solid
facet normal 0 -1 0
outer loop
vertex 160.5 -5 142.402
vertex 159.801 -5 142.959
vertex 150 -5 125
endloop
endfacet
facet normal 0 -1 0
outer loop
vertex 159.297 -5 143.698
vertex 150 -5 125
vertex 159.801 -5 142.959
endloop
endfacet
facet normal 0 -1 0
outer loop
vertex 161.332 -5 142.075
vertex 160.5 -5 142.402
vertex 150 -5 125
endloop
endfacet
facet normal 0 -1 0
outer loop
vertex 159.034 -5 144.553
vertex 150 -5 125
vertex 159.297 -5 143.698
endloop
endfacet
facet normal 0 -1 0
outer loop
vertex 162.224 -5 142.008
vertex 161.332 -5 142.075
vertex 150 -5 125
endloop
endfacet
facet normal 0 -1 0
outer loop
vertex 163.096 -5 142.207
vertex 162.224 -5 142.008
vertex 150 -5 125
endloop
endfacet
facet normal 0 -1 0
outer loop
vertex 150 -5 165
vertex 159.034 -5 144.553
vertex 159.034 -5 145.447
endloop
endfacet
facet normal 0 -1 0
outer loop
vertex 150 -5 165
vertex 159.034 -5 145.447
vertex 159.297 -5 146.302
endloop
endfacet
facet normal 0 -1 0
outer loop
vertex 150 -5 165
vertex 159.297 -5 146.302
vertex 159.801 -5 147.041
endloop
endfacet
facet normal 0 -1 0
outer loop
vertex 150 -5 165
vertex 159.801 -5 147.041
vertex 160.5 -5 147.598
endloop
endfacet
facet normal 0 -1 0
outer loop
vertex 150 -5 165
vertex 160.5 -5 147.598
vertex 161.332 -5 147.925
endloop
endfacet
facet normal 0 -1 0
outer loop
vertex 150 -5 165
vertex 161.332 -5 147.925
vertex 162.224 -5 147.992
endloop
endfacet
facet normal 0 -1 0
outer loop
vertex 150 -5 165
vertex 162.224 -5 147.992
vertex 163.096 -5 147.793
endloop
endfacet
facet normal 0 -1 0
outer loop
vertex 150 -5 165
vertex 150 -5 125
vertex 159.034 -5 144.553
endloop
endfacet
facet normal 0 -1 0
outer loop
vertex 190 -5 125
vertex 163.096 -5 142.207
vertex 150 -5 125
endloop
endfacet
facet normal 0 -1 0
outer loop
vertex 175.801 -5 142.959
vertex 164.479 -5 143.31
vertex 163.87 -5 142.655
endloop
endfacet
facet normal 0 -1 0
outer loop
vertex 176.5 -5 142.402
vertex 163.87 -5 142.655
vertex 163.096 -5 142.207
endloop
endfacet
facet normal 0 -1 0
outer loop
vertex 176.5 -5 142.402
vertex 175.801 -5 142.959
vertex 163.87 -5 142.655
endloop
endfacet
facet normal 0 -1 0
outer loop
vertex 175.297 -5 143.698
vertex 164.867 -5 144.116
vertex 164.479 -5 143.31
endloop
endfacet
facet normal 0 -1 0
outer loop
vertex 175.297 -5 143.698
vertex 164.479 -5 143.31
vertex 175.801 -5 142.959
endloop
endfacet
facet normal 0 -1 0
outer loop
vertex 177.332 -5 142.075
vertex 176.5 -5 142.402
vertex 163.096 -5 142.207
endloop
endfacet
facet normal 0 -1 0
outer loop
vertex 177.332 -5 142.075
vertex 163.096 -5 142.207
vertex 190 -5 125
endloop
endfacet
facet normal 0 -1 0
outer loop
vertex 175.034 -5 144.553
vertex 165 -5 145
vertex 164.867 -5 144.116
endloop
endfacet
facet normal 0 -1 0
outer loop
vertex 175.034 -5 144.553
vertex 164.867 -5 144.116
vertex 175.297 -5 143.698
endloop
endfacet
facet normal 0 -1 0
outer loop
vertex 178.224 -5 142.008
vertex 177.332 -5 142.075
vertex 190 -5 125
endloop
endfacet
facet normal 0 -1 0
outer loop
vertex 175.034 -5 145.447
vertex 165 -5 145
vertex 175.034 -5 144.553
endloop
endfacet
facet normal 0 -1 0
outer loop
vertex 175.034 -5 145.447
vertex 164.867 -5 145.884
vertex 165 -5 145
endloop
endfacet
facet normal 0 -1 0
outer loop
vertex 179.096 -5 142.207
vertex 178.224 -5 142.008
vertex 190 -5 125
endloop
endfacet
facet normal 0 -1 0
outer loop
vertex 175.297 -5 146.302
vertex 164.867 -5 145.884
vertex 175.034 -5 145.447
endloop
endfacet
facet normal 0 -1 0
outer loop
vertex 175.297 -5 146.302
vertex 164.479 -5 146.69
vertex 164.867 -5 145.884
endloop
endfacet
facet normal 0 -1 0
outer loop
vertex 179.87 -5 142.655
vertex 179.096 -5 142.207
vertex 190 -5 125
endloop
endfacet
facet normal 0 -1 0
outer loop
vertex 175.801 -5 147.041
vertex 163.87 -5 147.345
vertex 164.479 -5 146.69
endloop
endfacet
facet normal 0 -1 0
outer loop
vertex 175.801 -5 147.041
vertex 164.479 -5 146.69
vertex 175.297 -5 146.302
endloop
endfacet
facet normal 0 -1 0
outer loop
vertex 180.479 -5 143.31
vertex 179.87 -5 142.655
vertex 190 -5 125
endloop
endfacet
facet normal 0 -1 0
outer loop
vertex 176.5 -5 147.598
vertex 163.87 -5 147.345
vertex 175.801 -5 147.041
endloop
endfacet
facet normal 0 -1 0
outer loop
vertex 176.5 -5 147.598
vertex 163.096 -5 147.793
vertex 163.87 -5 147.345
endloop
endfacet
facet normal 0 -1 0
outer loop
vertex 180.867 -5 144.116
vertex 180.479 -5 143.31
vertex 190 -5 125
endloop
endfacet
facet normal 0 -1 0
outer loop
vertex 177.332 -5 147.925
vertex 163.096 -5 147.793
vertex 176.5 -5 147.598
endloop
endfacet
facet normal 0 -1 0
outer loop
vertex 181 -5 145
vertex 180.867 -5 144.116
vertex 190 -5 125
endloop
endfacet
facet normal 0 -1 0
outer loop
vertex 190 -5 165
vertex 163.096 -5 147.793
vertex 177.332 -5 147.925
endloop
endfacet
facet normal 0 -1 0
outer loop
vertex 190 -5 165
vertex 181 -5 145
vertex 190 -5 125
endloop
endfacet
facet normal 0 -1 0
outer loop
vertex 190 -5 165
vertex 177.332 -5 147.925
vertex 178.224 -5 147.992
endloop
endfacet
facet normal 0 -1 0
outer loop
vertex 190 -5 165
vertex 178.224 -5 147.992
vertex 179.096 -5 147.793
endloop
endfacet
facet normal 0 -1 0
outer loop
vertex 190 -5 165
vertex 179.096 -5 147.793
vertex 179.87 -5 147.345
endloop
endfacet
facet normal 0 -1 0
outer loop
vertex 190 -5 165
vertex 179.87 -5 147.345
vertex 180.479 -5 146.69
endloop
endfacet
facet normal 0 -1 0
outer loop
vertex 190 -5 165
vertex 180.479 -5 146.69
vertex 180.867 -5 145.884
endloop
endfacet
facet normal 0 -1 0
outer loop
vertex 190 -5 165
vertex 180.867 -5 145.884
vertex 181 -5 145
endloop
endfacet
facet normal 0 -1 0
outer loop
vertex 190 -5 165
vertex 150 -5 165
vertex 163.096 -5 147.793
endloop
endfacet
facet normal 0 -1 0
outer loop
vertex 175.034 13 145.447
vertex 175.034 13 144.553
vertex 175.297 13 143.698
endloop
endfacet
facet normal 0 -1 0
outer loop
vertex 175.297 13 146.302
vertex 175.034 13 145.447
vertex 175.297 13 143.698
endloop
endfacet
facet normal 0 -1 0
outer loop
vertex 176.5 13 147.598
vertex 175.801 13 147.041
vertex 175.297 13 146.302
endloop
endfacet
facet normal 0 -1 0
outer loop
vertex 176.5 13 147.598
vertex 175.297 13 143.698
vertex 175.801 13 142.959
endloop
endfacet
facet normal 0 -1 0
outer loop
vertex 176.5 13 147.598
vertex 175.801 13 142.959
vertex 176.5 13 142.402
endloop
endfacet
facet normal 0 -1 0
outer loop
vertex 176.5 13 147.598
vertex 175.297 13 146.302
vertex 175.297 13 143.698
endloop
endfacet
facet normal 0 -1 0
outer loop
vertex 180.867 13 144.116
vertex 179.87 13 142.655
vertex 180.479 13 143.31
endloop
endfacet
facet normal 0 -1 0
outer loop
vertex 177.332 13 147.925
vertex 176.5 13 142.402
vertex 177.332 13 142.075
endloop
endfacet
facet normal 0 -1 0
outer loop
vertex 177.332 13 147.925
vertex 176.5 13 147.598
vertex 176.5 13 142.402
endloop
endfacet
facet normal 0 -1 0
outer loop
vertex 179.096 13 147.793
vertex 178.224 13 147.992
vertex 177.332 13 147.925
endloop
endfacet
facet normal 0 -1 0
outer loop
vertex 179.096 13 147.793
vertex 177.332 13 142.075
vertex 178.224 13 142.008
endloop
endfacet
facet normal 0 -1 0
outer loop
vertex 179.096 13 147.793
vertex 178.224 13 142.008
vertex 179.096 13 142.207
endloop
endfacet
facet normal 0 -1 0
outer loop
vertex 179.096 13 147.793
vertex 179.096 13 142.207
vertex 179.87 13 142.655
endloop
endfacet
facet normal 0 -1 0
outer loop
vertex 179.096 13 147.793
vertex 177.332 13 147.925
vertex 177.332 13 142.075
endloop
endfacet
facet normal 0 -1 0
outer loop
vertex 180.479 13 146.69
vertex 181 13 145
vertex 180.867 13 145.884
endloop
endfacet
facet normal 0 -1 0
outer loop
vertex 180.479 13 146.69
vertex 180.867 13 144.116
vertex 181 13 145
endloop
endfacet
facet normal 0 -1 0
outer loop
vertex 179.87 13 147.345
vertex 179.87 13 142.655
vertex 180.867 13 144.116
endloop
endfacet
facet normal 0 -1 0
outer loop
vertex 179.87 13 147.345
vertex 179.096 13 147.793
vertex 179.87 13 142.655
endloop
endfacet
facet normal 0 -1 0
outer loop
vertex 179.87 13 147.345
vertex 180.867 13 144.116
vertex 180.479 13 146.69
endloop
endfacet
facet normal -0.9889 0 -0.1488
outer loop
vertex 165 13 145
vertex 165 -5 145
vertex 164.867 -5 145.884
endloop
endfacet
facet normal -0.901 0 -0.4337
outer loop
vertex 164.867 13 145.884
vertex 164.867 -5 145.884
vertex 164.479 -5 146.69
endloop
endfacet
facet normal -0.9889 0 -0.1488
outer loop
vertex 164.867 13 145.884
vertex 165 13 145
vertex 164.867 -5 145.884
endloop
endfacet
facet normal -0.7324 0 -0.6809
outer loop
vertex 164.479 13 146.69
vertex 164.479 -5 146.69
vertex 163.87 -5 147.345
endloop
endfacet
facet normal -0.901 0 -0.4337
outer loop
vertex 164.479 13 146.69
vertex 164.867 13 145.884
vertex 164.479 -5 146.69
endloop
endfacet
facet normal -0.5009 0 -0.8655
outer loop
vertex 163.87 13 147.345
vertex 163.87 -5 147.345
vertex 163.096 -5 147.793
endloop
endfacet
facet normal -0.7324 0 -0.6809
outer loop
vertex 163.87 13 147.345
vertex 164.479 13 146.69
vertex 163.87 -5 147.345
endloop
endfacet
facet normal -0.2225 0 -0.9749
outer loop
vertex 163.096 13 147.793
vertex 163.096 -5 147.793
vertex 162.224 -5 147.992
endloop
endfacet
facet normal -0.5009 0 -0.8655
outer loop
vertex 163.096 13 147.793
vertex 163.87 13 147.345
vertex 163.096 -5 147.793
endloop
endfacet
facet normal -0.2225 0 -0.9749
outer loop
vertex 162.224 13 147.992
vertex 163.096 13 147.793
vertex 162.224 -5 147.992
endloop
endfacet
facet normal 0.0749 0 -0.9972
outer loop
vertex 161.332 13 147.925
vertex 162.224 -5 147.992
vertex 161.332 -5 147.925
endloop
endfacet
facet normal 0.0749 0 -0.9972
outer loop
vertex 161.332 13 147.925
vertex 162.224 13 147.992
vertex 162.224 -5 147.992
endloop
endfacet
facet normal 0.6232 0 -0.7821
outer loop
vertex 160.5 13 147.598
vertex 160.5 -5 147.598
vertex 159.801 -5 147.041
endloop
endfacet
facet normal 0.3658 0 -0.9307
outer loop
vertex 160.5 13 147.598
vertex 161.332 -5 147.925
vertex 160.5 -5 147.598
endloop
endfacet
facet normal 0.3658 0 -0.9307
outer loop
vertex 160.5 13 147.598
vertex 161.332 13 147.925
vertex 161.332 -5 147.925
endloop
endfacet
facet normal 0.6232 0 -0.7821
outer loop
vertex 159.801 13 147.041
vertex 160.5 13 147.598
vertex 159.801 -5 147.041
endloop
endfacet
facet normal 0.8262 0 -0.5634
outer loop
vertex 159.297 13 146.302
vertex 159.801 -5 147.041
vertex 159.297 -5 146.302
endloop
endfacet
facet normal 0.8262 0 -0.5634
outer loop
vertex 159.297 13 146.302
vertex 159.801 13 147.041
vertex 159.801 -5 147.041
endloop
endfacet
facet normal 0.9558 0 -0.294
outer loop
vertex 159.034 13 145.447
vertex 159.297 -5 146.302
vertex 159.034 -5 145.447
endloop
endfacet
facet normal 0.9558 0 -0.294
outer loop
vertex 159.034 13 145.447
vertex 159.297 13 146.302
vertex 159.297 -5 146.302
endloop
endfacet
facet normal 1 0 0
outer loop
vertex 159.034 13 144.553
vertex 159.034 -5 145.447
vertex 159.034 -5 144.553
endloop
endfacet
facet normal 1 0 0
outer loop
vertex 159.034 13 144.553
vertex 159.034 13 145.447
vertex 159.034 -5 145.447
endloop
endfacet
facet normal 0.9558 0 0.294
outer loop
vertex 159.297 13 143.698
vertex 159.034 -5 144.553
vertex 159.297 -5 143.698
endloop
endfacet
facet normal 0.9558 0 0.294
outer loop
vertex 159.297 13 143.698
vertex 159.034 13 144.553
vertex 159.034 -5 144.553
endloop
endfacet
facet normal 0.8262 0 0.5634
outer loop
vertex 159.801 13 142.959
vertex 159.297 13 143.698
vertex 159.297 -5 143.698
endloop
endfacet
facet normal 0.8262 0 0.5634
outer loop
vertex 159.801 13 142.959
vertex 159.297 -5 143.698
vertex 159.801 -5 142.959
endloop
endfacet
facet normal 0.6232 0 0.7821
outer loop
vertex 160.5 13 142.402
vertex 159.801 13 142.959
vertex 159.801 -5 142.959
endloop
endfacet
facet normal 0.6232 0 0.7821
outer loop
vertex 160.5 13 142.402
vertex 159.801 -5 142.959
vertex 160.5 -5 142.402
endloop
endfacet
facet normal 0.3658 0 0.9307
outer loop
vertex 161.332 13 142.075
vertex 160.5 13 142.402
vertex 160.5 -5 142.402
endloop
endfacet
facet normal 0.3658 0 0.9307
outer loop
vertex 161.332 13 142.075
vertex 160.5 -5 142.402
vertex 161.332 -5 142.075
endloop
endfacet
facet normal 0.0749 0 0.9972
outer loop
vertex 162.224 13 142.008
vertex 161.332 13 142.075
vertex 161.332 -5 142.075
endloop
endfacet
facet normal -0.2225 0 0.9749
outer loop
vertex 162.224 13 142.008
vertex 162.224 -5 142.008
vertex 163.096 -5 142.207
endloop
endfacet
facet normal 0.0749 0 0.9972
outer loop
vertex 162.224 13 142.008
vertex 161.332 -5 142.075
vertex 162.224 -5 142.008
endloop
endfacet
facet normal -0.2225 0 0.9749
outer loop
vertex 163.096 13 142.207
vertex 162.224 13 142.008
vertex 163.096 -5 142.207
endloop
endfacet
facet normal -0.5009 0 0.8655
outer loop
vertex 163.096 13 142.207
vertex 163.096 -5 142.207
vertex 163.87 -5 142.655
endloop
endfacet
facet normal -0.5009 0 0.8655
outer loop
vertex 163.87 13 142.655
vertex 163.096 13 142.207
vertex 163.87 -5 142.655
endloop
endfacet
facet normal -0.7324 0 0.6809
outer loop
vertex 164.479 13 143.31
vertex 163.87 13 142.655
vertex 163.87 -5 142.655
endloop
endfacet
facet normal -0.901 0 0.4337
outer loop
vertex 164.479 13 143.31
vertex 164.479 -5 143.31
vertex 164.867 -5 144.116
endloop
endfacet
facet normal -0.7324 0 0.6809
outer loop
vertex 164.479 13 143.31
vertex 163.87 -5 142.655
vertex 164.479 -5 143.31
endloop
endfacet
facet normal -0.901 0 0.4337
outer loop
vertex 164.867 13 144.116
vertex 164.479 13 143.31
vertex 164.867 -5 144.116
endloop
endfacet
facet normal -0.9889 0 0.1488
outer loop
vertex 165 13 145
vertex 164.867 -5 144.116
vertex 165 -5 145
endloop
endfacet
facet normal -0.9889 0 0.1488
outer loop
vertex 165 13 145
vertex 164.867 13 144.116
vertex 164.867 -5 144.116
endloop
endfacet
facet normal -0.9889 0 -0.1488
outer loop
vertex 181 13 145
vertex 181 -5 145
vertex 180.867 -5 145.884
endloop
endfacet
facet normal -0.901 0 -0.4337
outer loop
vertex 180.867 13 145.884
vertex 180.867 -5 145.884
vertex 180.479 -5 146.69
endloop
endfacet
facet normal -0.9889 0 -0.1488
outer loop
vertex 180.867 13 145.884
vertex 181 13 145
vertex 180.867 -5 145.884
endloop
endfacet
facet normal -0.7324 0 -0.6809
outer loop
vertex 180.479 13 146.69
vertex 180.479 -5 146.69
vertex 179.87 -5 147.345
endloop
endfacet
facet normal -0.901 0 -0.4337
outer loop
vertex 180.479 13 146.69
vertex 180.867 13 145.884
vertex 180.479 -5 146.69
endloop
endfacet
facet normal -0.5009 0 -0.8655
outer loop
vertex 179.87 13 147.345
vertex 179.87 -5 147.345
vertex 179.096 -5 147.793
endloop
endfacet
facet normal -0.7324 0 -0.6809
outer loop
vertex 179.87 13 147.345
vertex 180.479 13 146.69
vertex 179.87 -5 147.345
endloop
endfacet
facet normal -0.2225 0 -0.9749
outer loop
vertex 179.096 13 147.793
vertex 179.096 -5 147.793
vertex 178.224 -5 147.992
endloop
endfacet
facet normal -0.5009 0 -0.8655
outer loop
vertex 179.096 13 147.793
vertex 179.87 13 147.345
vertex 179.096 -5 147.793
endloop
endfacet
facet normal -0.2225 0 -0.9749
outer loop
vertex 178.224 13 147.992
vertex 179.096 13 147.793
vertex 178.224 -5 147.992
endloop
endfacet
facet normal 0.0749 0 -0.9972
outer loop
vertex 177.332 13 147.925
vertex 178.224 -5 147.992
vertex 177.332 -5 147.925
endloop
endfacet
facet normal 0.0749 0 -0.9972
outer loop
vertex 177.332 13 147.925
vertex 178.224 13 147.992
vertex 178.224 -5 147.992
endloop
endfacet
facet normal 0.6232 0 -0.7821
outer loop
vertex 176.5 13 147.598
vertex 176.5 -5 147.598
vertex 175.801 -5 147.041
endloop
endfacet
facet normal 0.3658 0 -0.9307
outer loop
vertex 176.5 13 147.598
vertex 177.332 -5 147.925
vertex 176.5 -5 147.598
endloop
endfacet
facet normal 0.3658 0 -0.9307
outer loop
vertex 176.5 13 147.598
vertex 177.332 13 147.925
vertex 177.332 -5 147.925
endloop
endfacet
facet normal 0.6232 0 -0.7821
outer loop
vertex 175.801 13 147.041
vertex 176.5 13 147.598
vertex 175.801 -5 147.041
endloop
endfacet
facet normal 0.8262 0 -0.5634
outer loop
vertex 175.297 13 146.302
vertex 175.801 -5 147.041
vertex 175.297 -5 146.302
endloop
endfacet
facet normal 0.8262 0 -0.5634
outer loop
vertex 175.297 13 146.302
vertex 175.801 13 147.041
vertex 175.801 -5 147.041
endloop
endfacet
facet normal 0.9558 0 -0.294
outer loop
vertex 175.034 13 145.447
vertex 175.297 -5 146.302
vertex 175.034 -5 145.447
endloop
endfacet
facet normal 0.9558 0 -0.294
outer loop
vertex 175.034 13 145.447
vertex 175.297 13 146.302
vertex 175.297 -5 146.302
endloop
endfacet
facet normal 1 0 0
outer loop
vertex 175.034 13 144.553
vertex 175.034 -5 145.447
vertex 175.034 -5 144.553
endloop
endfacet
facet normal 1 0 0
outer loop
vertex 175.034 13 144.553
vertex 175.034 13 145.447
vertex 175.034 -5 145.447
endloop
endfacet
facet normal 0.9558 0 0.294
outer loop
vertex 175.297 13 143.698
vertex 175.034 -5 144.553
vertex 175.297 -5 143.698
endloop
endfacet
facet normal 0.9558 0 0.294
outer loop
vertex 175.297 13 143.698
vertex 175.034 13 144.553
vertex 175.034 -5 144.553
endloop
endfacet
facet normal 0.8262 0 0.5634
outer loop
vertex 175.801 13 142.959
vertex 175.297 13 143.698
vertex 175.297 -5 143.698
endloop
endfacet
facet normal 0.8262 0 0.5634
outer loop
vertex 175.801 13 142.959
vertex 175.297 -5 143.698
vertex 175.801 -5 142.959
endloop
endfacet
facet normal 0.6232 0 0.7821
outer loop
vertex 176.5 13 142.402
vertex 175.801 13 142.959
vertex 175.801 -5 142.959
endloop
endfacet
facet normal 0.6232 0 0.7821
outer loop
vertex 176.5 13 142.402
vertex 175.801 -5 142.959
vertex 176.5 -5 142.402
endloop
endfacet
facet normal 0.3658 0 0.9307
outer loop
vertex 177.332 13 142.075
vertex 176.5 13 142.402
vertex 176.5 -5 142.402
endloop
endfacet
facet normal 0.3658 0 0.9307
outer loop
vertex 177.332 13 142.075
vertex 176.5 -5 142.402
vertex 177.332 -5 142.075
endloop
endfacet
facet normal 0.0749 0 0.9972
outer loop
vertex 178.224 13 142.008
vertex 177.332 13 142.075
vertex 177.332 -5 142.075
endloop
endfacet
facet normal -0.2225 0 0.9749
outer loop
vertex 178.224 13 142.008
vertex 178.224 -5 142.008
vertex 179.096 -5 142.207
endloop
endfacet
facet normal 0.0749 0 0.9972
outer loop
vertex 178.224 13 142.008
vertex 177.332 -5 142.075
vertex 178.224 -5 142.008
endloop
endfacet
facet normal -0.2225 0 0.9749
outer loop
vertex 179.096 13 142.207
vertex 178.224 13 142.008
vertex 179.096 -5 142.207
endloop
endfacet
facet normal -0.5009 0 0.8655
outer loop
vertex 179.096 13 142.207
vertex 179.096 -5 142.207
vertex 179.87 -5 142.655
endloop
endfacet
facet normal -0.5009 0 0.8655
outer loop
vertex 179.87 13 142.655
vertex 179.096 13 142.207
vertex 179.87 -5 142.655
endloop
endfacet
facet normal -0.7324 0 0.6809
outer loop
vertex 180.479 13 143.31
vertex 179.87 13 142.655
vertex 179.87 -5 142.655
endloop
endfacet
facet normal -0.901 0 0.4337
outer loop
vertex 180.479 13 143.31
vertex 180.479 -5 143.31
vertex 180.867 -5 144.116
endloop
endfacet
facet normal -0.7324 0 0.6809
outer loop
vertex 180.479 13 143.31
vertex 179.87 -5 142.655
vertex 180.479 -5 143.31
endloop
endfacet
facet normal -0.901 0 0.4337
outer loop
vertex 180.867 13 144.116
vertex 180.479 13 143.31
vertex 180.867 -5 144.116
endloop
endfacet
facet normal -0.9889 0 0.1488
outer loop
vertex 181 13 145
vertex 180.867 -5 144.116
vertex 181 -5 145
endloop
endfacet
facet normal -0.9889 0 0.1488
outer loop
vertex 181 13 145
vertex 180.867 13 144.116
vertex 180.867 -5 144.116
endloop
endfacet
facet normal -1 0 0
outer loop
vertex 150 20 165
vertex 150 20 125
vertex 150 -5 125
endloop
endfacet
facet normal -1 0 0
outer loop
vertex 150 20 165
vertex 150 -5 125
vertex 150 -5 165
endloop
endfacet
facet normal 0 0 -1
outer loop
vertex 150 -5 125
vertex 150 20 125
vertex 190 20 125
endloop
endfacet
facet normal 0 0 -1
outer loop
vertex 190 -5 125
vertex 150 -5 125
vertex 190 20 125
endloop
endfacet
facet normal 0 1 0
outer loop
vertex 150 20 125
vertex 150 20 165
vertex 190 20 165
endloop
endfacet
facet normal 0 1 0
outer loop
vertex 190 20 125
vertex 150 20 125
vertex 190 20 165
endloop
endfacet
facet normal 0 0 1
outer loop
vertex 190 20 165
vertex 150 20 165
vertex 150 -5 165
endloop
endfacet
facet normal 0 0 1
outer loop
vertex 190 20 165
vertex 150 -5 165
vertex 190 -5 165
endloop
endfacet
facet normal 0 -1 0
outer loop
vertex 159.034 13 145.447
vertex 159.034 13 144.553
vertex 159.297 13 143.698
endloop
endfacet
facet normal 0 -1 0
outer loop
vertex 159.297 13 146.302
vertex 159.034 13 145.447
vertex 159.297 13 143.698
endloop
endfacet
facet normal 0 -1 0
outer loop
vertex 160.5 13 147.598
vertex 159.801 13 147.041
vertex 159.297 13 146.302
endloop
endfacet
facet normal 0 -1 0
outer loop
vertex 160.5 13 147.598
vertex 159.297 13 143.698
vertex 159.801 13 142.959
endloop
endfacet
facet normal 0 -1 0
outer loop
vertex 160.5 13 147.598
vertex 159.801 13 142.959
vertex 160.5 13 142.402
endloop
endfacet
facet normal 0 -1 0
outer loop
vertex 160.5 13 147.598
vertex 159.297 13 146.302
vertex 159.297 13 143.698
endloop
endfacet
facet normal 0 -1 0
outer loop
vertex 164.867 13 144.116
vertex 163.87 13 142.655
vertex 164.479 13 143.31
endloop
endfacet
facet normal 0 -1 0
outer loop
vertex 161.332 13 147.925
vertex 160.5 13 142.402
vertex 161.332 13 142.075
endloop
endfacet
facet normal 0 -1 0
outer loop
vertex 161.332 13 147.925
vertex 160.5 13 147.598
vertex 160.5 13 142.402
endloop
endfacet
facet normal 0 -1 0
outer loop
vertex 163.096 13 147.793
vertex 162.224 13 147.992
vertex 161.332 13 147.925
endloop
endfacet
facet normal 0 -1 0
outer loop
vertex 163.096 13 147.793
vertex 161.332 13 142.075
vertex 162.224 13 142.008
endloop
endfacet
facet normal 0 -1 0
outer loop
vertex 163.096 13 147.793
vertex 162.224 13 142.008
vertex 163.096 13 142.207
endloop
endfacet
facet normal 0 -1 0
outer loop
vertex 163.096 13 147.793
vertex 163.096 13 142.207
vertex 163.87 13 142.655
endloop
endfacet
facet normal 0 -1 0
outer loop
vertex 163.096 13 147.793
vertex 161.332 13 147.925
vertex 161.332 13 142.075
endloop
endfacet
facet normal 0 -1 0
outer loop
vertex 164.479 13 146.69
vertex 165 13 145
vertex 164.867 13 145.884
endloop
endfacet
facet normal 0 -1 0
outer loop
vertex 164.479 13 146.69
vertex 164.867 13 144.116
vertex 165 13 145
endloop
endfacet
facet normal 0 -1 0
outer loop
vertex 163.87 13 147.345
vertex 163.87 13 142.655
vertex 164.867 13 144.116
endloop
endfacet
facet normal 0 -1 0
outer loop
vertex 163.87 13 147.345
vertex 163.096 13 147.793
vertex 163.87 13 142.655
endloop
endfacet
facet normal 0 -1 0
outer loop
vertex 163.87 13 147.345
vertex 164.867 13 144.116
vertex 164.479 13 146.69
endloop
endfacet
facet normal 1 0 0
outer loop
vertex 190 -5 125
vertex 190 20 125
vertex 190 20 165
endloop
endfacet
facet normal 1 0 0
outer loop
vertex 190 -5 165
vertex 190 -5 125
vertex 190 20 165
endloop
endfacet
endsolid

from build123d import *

# Parameters (mm, degrees)
CYLINDER016_R          = 3
CYLINDER016_DEPTH      = 20
CYLINDER016_ROLL_ANGLE = 90
CYLINDER015_R          = 3
CYLINDER015_DEPTH      = 20
CYLINDER015_ROLL_ANGLE = 90
BOX016_W               = 40
BOX016_H               = 40
BOX016_DEPTH           = 25
BOX016_ROLL_ANGLE      = 90


with BuildPart() as cylinder016:
    # Cylinder016 → Cylinder016 (new body)
    with BuildSketch(Plane.XY):
        Circle(CYLINDER016_R)
    extrude(amount=CYLINDER016_DEPTH)


with BuildPart() as cylinder016_1:
    # Cylinder016 roll: moved
    add(cylinder016.part.rotate(Axis((0, 0, 0), (1, 0, 0)), CYLINDER016_ROLL_ANGLE))


with BuildPart() as cylinder016_2:
    # Cylinder016 placement: moved
    add(cylinder016_1.part.moved(Location((162, -7, 145))))


with BuildPart() as cylinder015:
    # Cylinder015 → Cylinder015 (new body)
    with BuildSketch(Plane.XY):
        Circle(CYLINDER015_R)
    extrude(amount=CYLINDER015_DEPTH)


with BuildPart() as cylinder015_1:
    # Cylinder015 roll: moved
    add(cylinder015.part.rotate(Axis((0, 0, 0), (1, 0, 0)), CYLINDER015_ROLL_ANGLE))


with BuildPart() as cylinder015_2:
    # Cylinder015 placement: moved
    add(cylinder015_1.part.moved(Location((178, -7, 145))))


with BuildPart() as cut009:
    # Box016 → Box016 (new body)
    with BuildSketch(Plane.XY):
        with Locations((20, 20)):
            Rectangle(BOX016_W, BOX016_H)
    extrude(amount=BOX016_DEPTH)


with BuildPart() as cut009_1:
    # Box016 roll: moved
    add(cut009.part.rotate(Axis((0, 0, 0), (1, 0, 0)), BOX016_ROLL_ANGLE))


with BuildPart() as cut009_2:
    # Box016 placement: moved
    add(cut009_1.part.moved(Location((150, 0, 125))))

    # Cut008: cut Cylinder015
    add(cylinder015_2.part, mode=Mode.SUBTRACT)

    # Cut009: cut Cylinder016
    add(cylinder016_2.part, mode=Mode.SUBTRACT)


with BuildPart() as cut009_3:
    # Cut009 placement: moved
    add(cut009_2.part.moved(Location((0, 20, 0))))


solid = cut009_3.part
